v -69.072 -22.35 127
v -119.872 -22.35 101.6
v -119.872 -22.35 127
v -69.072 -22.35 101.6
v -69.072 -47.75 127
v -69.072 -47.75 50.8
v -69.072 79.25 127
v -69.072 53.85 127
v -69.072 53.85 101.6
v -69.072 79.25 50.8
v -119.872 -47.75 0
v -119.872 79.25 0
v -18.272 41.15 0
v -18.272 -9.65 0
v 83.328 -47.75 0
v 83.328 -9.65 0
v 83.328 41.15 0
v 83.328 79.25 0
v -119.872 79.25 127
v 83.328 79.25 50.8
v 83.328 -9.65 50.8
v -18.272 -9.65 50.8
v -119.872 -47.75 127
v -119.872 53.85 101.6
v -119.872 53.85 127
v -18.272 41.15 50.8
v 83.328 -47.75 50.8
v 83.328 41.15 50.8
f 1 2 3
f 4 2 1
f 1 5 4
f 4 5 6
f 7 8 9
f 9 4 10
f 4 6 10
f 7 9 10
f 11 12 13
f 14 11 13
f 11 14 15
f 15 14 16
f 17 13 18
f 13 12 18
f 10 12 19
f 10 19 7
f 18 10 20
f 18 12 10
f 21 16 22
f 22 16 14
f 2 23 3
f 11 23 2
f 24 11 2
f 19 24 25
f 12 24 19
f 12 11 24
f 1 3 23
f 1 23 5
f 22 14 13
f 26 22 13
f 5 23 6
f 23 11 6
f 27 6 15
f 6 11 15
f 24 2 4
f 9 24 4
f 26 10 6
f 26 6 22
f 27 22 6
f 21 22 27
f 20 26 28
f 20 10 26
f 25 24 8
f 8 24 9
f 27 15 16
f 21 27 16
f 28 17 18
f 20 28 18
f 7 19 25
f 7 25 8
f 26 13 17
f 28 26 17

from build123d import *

# Parameters (mm, degrees)
F1_DEPTH = 50.8
F2_W     = 50.8
F2_H     = 127
F3_DEPTH = 50.8
F4_W     = 50.8
F4_H     = 25.4
F5_DEPTH = 25.4
F6_W     = 50.8
F6_H     = 25.4
F7_DEPTH = 25.4


with BuildPart() as f1:
    # F0 (on Top) → F1 (new body)
    with BuildSketch(Plane.XY):
        Polygon((83.328486, 79.250188), (-119.871514, 79.250188), (-119.871514, -47.749812), (83.328486, -47.749812), (83.328486, -9.649812), (-18.271514, -9.649812), (-18.271514, 41.150188), (83.328486, 41.150188), align=None)
    extrude(amount=F1_DEPTH)

    # F2 (on face) → F3 (join)
    with BuildSketch(Plane.XY.offset(50.8)):
        with Locations((-94.471514, 15.750188)):
            Rectangle(F2_W, F2_H)
    extrude(amount=F3_DEPTH)

    # F4 (on face) → F5 (join)
    with BuildSketch(Plane.XY.offset(101.6)):
        with Locations((-94.471514, -35.049812)):
            Rectangle(F4_W, F4_H)
    extrude(amount=F5_DEPTH)

    # F6 (on face) → F7 (join)
    with BuildSketch(Plane.XY.offset(101.6)):
        with Locations((-94.471514, 66.550188)):
            Rectangle(F6_W, F6_H)
    extrude(amount=F7_DEPTH)


solid = f1.part
